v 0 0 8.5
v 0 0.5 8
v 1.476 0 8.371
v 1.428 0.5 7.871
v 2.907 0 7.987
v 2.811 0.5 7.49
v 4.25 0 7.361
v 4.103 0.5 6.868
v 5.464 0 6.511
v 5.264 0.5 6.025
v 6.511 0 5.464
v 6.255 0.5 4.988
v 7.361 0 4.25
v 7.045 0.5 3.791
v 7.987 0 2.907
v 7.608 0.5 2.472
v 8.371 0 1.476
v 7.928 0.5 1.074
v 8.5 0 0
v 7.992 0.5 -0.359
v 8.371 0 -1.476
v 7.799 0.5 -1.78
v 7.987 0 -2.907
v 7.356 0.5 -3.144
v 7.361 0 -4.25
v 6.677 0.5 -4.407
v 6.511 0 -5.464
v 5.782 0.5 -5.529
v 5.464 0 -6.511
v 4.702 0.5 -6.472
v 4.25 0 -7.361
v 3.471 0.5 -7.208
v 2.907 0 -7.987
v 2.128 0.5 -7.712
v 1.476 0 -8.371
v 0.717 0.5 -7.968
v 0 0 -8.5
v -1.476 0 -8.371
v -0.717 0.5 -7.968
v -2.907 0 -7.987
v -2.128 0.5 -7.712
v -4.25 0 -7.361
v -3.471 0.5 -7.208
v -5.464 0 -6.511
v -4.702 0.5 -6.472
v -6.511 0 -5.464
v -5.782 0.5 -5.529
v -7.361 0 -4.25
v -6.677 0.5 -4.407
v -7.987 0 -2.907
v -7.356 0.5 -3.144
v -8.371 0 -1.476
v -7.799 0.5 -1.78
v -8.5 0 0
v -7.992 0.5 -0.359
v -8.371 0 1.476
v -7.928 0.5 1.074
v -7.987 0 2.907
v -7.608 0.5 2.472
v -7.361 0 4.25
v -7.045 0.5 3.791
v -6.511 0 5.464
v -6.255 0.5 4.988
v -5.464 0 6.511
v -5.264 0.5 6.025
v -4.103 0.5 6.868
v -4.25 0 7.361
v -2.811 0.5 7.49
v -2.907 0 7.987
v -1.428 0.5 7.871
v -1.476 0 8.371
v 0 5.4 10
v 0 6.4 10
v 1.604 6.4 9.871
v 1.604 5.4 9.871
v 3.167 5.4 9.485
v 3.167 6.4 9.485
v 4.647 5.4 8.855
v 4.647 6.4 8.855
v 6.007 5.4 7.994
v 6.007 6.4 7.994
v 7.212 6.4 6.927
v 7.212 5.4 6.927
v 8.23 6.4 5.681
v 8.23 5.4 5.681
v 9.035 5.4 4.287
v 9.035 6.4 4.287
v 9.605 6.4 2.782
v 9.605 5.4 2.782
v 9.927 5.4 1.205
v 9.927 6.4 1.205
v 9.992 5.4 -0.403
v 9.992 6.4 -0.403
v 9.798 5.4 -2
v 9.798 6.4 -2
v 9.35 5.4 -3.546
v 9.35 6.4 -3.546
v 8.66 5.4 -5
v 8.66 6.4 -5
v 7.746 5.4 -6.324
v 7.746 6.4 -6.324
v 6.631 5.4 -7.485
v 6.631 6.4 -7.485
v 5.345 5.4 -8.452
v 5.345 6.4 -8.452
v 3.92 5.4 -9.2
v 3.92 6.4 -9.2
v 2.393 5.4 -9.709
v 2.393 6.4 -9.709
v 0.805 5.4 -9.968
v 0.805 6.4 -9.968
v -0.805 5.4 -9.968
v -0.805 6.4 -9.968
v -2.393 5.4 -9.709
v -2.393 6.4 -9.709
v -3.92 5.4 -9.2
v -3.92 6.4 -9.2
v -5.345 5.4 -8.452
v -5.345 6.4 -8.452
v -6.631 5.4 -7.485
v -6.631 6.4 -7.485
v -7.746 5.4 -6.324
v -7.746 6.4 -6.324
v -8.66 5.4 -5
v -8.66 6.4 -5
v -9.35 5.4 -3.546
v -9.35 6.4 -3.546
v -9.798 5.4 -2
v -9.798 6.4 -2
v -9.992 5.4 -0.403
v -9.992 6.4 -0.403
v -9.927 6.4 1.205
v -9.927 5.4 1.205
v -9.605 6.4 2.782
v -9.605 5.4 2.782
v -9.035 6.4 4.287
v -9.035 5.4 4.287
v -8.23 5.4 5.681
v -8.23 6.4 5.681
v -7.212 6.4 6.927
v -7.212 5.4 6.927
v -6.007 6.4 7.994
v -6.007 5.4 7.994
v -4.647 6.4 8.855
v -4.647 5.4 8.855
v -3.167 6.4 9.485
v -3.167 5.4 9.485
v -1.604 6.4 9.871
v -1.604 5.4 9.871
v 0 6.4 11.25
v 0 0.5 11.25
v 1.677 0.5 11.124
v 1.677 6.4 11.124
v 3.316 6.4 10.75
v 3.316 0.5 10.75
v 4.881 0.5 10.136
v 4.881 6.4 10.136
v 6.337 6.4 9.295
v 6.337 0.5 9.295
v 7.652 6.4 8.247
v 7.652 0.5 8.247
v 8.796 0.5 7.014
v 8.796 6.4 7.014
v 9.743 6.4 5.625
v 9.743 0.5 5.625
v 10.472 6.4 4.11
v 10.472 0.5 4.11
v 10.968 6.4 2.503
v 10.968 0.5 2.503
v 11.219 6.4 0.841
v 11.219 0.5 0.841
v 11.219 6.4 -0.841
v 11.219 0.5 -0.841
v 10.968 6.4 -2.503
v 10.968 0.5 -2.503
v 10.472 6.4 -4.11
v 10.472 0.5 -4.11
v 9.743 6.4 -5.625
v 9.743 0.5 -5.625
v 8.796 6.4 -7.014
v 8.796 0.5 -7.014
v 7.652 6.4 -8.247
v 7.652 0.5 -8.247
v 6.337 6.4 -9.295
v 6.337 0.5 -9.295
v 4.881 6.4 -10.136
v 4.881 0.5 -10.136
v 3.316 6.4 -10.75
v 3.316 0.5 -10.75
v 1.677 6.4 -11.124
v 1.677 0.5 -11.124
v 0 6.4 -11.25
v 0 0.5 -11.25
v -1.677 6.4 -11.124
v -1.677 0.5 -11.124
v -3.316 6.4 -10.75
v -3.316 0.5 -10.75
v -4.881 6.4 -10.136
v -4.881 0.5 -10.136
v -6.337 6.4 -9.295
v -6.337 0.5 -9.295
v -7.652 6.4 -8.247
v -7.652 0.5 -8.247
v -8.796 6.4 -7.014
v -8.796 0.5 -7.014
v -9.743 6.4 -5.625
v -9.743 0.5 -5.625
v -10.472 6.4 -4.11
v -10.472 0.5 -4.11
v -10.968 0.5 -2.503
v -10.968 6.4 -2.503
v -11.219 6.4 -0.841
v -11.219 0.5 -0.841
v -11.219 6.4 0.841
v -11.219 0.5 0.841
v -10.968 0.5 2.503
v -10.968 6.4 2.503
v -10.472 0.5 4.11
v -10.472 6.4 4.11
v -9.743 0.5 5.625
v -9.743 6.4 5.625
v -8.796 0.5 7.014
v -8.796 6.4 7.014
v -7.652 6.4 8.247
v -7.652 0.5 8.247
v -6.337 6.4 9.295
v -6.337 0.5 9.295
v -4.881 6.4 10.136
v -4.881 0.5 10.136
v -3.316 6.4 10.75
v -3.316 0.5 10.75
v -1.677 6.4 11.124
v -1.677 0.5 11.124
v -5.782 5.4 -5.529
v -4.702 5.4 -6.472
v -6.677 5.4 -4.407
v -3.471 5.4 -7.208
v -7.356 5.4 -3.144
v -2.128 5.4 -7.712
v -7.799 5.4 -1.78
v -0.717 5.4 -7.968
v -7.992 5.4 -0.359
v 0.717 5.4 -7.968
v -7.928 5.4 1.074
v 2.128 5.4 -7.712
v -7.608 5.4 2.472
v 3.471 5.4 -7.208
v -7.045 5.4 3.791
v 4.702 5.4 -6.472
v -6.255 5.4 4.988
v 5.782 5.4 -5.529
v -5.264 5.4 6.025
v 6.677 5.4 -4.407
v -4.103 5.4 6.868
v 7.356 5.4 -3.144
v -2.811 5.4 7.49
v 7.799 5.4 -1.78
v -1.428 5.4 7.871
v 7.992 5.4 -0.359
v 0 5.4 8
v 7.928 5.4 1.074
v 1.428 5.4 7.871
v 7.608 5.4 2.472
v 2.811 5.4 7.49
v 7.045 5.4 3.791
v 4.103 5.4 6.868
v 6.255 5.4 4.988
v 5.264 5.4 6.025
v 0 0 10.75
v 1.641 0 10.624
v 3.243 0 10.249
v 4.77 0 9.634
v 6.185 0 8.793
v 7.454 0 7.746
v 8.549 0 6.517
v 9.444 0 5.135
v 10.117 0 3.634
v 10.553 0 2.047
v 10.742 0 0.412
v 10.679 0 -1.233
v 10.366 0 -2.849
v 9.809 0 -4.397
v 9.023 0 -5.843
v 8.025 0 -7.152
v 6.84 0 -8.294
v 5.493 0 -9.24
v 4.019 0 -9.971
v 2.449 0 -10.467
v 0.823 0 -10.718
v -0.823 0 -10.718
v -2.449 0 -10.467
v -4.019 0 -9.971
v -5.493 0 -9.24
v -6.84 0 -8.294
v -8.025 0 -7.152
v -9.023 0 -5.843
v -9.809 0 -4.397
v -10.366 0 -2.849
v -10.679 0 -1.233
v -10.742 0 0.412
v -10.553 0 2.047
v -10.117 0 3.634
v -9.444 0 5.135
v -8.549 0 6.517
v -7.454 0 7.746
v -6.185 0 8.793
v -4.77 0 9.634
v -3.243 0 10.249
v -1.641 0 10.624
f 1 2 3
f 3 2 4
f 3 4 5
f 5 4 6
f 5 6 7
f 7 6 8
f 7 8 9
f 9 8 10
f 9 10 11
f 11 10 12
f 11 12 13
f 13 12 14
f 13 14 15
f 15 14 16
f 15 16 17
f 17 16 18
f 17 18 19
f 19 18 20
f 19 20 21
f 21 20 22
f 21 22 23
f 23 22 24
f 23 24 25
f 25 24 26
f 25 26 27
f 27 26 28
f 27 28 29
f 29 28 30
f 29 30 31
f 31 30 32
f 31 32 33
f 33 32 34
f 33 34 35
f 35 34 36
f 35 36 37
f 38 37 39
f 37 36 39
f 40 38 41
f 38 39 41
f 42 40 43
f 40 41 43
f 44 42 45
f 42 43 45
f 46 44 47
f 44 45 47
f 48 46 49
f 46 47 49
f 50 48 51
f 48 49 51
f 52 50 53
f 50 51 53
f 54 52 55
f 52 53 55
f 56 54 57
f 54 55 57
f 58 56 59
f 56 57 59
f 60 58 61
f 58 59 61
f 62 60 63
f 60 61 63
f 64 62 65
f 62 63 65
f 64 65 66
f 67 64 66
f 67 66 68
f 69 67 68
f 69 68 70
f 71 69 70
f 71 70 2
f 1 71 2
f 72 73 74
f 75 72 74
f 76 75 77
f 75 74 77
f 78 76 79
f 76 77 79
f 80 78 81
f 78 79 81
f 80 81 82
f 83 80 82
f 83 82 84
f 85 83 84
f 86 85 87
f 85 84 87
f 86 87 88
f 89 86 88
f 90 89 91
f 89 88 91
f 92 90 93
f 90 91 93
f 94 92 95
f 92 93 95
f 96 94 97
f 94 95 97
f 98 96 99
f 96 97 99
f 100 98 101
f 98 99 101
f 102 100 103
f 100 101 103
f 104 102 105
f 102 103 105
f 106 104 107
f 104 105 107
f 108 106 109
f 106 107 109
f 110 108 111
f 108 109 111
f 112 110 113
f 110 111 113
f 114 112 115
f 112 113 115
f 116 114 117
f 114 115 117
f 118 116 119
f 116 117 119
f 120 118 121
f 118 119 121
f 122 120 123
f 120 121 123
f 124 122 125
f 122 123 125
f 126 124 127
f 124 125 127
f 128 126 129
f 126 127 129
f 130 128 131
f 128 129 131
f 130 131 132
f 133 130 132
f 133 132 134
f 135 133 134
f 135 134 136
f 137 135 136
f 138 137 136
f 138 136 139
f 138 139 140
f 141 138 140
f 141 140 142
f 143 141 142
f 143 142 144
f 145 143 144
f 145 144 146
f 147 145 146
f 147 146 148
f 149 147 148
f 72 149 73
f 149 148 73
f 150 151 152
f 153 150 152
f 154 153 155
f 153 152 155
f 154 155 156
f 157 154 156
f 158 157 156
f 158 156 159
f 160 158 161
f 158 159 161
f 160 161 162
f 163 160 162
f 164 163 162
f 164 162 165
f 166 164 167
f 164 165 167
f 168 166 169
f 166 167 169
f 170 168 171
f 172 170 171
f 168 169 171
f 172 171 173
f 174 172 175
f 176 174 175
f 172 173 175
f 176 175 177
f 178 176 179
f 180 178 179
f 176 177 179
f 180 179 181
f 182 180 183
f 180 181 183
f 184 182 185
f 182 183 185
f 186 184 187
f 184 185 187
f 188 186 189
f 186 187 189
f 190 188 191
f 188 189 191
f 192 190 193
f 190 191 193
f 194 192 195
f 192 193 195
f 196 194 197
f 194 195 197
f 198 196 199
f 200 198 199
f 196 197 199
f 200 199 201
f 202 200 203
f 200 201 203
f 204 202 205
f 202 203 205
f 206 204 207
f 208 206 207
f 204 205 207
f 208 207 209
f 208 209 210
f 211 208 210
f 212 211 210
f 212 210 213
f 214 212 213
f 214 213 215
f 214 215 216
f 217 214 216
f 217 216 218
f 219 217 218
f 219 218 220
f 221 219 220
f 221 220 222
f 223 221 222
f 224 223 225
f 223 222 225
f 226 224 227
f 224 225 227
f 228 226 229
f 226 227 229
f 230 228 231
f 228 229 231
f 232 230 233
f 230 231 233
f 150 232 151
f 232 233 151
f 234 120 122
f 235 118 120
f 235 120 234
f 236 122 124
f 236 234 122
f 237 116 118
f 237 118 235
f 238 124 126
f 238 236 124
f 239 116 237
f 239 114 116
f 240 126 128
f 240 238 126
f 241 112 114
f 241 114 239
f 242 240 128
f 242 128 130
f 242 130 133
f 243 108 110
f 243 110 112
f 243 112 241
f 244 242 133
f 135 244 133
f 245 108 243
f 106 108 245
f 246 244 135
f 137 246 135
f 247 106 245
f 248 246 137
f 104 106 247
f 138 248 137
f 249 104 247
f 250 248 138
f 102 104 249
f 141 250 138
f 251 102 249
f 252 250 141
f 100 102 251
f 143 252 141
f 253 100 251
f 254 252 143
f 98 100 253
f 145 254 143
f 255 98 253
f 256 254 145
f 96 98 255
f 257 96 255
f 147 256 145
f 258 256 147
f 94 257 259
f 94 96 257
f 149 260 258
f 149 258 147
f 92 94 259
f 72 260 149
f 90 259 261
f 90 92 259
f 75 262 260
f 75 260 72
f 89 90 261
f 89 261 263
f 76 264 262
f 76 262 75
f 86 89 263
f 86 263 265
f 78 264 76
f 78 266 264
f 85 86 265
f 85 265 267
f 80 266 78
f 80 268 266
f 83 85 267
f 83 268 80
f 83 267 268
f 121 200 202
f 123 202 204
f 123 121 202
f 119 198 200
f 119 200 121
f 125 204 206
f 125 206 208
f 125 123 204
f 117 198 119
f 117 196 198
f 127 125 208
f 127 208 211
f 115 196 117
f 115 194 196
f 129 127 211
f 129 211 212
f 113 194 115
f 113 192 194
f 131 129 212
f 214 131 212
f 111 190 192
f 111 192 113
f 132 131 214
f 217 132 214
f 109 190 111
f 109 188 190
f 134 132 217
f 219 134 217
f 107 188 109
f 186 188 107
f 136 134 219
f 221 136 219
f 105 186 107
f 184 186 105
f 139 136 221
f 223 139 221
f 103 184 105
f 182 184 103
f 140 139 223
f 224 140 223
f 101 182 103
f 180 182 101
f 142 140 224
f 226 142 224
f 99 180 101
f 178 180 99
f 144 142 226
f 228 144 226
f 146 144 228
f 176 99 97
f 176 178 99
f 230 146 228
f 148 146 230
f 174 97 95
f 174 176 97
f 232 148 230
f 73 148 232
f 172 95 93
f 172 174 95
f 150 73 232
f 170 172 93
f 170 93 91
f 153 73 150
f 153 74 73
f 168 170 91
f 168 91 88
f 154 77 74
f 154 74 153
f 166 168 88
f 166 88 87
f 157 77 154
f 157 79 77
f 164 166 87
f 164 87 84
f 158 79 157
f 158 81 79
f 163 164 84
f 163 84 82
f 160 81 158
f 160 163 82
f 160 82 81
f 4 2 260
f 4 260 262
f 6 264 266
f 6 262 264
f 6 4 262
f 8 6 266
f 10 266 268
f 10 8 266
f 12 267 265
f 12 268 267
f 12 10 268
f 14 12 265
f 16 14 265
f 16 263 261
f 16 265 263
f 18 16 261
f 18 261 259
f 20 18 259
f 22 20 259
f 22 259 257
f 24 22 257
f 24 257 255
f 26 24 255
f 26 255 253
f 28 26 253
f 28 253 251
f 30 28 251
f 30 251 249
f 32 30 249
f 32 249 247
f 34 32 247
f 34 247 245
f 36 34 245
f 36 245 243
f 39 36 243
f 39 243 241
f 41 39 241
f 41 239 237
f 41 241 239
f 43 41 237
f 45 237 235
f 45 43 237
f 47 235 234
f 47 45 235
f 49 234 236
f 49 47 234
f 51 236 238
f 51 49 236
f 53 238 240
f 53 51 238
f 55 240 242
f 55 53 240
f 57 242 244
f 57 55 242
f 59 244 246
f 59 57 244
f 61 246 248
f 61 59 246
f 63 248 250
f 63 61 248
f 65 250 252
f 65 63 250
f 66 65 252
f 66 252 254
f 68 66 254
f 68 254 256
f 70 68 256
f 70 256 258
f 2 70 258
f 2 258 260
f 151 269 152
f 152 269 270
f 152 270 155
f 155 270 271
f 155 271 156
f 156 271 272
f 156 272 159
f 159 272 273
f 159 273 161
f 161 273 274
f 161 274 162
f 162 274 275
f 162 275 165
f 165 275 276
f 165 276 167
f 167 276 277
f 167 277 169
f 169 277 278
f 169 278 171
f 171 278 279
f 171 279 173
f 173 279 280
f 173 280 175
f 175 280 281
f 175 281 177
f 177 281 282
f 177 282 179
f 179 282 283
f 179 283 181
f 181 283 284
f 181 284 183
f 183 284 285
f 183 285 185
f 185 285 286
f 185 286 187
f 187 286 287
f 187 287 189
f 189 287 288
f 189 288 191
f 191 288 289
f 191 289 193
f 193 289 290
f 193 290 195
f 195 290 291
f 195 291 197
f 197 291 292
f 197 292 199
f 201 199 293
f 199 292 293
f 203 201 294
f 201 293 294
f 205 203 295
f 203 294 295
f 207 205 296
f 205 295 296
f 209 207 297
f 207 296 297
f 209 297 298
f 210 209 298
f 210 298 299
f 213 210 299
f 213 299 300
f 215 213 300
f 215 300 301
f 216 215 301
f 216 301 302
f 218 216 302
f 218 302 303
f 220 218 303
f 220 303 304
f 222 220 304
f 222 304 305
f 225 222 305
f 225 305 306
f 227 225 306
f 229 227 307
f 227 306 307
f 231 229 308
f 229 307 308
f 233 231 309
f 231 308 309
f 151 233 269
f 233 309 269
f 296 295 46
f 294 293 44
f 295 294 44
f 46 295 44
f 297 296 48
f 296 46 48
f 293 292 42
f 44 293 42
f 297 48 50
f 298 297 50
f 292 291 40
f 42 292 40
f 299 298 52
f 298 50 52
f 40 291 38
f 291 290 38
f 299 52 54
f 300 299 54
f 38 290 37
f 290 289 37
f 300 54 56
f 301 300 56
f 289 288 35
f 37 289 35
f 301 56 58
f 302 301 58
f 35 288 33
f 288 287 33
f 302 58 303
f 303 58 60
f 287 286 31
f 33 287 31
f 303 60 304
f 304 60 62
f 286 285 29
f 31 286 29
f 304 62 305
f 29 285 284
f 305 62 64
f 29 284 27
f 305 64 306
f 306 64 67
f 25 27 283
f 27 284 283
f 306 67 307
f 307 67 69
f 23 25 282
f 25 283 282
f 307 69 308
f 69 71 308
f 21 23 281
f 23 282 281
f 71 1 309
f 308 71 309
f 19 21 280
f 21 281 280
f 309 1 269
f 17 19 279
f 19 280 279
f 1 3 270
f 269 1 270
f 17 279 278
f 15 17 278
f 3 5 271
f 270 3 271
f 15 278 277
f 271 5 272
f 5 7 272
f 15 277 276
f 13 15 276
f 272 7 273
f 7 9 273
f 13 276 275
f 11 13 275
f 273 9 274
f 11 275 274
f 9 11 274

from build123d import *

# Parameters (mm, degrees)
SKETCH1_R           = 11.25
SKETCH1_R_2         = 8
BOSS_EXTRUDE1_DEPTH = 6.4
SKETCH2_R           = 10
CUT_EXTRUDE1_DEPTH  = 1
CHAMFER1_SIZE       = 0.5


with BuildPart() as part:
    # Sketch1 → Boss-Extrude1 (new body)
    with BuildSketch(Plane(origin=(0, 0, 0), x_dir=(1, 0, 0), z_dir=(0, 1, 0))):
        with Locations(Location((0, 0, 0), (0, 0, 270))):
            Circle(SKETCH1_R)
        with Locations(Location((0, 0, 0), (0, 0, 270))):
            Circle(SKETCH1_R_2, mode=Mode.SUBTRACT)
    extrude(amount=BOSS_EXTRUDE1_DEPTH)

    # Sketch2 → Cut-Extrude1 (cut)
    with BuildSketch(Plane(origin=(0, 6.4, 0), x_dir=(1, 0, 0), z_dir=(0, 1, 0))):
        with Locations(Location((0, 0, 0), (0, 0, 270))):
            Circle(SKETCH2_R)
    extrude(amount=-CUT_EXTRUDE1_DEPTH, mode=Mode.SUBTRACT)

    # Chamfer1
    chamfer1_edges = [part.edges().sort_by_distance(p)[0] for p in [
        (0, 0, -11.25),
        (0, 0, -8),
    ]]
    chamfer(chamfer1_edges, length=CHAMFER1_SIZE)


solid = part.part
